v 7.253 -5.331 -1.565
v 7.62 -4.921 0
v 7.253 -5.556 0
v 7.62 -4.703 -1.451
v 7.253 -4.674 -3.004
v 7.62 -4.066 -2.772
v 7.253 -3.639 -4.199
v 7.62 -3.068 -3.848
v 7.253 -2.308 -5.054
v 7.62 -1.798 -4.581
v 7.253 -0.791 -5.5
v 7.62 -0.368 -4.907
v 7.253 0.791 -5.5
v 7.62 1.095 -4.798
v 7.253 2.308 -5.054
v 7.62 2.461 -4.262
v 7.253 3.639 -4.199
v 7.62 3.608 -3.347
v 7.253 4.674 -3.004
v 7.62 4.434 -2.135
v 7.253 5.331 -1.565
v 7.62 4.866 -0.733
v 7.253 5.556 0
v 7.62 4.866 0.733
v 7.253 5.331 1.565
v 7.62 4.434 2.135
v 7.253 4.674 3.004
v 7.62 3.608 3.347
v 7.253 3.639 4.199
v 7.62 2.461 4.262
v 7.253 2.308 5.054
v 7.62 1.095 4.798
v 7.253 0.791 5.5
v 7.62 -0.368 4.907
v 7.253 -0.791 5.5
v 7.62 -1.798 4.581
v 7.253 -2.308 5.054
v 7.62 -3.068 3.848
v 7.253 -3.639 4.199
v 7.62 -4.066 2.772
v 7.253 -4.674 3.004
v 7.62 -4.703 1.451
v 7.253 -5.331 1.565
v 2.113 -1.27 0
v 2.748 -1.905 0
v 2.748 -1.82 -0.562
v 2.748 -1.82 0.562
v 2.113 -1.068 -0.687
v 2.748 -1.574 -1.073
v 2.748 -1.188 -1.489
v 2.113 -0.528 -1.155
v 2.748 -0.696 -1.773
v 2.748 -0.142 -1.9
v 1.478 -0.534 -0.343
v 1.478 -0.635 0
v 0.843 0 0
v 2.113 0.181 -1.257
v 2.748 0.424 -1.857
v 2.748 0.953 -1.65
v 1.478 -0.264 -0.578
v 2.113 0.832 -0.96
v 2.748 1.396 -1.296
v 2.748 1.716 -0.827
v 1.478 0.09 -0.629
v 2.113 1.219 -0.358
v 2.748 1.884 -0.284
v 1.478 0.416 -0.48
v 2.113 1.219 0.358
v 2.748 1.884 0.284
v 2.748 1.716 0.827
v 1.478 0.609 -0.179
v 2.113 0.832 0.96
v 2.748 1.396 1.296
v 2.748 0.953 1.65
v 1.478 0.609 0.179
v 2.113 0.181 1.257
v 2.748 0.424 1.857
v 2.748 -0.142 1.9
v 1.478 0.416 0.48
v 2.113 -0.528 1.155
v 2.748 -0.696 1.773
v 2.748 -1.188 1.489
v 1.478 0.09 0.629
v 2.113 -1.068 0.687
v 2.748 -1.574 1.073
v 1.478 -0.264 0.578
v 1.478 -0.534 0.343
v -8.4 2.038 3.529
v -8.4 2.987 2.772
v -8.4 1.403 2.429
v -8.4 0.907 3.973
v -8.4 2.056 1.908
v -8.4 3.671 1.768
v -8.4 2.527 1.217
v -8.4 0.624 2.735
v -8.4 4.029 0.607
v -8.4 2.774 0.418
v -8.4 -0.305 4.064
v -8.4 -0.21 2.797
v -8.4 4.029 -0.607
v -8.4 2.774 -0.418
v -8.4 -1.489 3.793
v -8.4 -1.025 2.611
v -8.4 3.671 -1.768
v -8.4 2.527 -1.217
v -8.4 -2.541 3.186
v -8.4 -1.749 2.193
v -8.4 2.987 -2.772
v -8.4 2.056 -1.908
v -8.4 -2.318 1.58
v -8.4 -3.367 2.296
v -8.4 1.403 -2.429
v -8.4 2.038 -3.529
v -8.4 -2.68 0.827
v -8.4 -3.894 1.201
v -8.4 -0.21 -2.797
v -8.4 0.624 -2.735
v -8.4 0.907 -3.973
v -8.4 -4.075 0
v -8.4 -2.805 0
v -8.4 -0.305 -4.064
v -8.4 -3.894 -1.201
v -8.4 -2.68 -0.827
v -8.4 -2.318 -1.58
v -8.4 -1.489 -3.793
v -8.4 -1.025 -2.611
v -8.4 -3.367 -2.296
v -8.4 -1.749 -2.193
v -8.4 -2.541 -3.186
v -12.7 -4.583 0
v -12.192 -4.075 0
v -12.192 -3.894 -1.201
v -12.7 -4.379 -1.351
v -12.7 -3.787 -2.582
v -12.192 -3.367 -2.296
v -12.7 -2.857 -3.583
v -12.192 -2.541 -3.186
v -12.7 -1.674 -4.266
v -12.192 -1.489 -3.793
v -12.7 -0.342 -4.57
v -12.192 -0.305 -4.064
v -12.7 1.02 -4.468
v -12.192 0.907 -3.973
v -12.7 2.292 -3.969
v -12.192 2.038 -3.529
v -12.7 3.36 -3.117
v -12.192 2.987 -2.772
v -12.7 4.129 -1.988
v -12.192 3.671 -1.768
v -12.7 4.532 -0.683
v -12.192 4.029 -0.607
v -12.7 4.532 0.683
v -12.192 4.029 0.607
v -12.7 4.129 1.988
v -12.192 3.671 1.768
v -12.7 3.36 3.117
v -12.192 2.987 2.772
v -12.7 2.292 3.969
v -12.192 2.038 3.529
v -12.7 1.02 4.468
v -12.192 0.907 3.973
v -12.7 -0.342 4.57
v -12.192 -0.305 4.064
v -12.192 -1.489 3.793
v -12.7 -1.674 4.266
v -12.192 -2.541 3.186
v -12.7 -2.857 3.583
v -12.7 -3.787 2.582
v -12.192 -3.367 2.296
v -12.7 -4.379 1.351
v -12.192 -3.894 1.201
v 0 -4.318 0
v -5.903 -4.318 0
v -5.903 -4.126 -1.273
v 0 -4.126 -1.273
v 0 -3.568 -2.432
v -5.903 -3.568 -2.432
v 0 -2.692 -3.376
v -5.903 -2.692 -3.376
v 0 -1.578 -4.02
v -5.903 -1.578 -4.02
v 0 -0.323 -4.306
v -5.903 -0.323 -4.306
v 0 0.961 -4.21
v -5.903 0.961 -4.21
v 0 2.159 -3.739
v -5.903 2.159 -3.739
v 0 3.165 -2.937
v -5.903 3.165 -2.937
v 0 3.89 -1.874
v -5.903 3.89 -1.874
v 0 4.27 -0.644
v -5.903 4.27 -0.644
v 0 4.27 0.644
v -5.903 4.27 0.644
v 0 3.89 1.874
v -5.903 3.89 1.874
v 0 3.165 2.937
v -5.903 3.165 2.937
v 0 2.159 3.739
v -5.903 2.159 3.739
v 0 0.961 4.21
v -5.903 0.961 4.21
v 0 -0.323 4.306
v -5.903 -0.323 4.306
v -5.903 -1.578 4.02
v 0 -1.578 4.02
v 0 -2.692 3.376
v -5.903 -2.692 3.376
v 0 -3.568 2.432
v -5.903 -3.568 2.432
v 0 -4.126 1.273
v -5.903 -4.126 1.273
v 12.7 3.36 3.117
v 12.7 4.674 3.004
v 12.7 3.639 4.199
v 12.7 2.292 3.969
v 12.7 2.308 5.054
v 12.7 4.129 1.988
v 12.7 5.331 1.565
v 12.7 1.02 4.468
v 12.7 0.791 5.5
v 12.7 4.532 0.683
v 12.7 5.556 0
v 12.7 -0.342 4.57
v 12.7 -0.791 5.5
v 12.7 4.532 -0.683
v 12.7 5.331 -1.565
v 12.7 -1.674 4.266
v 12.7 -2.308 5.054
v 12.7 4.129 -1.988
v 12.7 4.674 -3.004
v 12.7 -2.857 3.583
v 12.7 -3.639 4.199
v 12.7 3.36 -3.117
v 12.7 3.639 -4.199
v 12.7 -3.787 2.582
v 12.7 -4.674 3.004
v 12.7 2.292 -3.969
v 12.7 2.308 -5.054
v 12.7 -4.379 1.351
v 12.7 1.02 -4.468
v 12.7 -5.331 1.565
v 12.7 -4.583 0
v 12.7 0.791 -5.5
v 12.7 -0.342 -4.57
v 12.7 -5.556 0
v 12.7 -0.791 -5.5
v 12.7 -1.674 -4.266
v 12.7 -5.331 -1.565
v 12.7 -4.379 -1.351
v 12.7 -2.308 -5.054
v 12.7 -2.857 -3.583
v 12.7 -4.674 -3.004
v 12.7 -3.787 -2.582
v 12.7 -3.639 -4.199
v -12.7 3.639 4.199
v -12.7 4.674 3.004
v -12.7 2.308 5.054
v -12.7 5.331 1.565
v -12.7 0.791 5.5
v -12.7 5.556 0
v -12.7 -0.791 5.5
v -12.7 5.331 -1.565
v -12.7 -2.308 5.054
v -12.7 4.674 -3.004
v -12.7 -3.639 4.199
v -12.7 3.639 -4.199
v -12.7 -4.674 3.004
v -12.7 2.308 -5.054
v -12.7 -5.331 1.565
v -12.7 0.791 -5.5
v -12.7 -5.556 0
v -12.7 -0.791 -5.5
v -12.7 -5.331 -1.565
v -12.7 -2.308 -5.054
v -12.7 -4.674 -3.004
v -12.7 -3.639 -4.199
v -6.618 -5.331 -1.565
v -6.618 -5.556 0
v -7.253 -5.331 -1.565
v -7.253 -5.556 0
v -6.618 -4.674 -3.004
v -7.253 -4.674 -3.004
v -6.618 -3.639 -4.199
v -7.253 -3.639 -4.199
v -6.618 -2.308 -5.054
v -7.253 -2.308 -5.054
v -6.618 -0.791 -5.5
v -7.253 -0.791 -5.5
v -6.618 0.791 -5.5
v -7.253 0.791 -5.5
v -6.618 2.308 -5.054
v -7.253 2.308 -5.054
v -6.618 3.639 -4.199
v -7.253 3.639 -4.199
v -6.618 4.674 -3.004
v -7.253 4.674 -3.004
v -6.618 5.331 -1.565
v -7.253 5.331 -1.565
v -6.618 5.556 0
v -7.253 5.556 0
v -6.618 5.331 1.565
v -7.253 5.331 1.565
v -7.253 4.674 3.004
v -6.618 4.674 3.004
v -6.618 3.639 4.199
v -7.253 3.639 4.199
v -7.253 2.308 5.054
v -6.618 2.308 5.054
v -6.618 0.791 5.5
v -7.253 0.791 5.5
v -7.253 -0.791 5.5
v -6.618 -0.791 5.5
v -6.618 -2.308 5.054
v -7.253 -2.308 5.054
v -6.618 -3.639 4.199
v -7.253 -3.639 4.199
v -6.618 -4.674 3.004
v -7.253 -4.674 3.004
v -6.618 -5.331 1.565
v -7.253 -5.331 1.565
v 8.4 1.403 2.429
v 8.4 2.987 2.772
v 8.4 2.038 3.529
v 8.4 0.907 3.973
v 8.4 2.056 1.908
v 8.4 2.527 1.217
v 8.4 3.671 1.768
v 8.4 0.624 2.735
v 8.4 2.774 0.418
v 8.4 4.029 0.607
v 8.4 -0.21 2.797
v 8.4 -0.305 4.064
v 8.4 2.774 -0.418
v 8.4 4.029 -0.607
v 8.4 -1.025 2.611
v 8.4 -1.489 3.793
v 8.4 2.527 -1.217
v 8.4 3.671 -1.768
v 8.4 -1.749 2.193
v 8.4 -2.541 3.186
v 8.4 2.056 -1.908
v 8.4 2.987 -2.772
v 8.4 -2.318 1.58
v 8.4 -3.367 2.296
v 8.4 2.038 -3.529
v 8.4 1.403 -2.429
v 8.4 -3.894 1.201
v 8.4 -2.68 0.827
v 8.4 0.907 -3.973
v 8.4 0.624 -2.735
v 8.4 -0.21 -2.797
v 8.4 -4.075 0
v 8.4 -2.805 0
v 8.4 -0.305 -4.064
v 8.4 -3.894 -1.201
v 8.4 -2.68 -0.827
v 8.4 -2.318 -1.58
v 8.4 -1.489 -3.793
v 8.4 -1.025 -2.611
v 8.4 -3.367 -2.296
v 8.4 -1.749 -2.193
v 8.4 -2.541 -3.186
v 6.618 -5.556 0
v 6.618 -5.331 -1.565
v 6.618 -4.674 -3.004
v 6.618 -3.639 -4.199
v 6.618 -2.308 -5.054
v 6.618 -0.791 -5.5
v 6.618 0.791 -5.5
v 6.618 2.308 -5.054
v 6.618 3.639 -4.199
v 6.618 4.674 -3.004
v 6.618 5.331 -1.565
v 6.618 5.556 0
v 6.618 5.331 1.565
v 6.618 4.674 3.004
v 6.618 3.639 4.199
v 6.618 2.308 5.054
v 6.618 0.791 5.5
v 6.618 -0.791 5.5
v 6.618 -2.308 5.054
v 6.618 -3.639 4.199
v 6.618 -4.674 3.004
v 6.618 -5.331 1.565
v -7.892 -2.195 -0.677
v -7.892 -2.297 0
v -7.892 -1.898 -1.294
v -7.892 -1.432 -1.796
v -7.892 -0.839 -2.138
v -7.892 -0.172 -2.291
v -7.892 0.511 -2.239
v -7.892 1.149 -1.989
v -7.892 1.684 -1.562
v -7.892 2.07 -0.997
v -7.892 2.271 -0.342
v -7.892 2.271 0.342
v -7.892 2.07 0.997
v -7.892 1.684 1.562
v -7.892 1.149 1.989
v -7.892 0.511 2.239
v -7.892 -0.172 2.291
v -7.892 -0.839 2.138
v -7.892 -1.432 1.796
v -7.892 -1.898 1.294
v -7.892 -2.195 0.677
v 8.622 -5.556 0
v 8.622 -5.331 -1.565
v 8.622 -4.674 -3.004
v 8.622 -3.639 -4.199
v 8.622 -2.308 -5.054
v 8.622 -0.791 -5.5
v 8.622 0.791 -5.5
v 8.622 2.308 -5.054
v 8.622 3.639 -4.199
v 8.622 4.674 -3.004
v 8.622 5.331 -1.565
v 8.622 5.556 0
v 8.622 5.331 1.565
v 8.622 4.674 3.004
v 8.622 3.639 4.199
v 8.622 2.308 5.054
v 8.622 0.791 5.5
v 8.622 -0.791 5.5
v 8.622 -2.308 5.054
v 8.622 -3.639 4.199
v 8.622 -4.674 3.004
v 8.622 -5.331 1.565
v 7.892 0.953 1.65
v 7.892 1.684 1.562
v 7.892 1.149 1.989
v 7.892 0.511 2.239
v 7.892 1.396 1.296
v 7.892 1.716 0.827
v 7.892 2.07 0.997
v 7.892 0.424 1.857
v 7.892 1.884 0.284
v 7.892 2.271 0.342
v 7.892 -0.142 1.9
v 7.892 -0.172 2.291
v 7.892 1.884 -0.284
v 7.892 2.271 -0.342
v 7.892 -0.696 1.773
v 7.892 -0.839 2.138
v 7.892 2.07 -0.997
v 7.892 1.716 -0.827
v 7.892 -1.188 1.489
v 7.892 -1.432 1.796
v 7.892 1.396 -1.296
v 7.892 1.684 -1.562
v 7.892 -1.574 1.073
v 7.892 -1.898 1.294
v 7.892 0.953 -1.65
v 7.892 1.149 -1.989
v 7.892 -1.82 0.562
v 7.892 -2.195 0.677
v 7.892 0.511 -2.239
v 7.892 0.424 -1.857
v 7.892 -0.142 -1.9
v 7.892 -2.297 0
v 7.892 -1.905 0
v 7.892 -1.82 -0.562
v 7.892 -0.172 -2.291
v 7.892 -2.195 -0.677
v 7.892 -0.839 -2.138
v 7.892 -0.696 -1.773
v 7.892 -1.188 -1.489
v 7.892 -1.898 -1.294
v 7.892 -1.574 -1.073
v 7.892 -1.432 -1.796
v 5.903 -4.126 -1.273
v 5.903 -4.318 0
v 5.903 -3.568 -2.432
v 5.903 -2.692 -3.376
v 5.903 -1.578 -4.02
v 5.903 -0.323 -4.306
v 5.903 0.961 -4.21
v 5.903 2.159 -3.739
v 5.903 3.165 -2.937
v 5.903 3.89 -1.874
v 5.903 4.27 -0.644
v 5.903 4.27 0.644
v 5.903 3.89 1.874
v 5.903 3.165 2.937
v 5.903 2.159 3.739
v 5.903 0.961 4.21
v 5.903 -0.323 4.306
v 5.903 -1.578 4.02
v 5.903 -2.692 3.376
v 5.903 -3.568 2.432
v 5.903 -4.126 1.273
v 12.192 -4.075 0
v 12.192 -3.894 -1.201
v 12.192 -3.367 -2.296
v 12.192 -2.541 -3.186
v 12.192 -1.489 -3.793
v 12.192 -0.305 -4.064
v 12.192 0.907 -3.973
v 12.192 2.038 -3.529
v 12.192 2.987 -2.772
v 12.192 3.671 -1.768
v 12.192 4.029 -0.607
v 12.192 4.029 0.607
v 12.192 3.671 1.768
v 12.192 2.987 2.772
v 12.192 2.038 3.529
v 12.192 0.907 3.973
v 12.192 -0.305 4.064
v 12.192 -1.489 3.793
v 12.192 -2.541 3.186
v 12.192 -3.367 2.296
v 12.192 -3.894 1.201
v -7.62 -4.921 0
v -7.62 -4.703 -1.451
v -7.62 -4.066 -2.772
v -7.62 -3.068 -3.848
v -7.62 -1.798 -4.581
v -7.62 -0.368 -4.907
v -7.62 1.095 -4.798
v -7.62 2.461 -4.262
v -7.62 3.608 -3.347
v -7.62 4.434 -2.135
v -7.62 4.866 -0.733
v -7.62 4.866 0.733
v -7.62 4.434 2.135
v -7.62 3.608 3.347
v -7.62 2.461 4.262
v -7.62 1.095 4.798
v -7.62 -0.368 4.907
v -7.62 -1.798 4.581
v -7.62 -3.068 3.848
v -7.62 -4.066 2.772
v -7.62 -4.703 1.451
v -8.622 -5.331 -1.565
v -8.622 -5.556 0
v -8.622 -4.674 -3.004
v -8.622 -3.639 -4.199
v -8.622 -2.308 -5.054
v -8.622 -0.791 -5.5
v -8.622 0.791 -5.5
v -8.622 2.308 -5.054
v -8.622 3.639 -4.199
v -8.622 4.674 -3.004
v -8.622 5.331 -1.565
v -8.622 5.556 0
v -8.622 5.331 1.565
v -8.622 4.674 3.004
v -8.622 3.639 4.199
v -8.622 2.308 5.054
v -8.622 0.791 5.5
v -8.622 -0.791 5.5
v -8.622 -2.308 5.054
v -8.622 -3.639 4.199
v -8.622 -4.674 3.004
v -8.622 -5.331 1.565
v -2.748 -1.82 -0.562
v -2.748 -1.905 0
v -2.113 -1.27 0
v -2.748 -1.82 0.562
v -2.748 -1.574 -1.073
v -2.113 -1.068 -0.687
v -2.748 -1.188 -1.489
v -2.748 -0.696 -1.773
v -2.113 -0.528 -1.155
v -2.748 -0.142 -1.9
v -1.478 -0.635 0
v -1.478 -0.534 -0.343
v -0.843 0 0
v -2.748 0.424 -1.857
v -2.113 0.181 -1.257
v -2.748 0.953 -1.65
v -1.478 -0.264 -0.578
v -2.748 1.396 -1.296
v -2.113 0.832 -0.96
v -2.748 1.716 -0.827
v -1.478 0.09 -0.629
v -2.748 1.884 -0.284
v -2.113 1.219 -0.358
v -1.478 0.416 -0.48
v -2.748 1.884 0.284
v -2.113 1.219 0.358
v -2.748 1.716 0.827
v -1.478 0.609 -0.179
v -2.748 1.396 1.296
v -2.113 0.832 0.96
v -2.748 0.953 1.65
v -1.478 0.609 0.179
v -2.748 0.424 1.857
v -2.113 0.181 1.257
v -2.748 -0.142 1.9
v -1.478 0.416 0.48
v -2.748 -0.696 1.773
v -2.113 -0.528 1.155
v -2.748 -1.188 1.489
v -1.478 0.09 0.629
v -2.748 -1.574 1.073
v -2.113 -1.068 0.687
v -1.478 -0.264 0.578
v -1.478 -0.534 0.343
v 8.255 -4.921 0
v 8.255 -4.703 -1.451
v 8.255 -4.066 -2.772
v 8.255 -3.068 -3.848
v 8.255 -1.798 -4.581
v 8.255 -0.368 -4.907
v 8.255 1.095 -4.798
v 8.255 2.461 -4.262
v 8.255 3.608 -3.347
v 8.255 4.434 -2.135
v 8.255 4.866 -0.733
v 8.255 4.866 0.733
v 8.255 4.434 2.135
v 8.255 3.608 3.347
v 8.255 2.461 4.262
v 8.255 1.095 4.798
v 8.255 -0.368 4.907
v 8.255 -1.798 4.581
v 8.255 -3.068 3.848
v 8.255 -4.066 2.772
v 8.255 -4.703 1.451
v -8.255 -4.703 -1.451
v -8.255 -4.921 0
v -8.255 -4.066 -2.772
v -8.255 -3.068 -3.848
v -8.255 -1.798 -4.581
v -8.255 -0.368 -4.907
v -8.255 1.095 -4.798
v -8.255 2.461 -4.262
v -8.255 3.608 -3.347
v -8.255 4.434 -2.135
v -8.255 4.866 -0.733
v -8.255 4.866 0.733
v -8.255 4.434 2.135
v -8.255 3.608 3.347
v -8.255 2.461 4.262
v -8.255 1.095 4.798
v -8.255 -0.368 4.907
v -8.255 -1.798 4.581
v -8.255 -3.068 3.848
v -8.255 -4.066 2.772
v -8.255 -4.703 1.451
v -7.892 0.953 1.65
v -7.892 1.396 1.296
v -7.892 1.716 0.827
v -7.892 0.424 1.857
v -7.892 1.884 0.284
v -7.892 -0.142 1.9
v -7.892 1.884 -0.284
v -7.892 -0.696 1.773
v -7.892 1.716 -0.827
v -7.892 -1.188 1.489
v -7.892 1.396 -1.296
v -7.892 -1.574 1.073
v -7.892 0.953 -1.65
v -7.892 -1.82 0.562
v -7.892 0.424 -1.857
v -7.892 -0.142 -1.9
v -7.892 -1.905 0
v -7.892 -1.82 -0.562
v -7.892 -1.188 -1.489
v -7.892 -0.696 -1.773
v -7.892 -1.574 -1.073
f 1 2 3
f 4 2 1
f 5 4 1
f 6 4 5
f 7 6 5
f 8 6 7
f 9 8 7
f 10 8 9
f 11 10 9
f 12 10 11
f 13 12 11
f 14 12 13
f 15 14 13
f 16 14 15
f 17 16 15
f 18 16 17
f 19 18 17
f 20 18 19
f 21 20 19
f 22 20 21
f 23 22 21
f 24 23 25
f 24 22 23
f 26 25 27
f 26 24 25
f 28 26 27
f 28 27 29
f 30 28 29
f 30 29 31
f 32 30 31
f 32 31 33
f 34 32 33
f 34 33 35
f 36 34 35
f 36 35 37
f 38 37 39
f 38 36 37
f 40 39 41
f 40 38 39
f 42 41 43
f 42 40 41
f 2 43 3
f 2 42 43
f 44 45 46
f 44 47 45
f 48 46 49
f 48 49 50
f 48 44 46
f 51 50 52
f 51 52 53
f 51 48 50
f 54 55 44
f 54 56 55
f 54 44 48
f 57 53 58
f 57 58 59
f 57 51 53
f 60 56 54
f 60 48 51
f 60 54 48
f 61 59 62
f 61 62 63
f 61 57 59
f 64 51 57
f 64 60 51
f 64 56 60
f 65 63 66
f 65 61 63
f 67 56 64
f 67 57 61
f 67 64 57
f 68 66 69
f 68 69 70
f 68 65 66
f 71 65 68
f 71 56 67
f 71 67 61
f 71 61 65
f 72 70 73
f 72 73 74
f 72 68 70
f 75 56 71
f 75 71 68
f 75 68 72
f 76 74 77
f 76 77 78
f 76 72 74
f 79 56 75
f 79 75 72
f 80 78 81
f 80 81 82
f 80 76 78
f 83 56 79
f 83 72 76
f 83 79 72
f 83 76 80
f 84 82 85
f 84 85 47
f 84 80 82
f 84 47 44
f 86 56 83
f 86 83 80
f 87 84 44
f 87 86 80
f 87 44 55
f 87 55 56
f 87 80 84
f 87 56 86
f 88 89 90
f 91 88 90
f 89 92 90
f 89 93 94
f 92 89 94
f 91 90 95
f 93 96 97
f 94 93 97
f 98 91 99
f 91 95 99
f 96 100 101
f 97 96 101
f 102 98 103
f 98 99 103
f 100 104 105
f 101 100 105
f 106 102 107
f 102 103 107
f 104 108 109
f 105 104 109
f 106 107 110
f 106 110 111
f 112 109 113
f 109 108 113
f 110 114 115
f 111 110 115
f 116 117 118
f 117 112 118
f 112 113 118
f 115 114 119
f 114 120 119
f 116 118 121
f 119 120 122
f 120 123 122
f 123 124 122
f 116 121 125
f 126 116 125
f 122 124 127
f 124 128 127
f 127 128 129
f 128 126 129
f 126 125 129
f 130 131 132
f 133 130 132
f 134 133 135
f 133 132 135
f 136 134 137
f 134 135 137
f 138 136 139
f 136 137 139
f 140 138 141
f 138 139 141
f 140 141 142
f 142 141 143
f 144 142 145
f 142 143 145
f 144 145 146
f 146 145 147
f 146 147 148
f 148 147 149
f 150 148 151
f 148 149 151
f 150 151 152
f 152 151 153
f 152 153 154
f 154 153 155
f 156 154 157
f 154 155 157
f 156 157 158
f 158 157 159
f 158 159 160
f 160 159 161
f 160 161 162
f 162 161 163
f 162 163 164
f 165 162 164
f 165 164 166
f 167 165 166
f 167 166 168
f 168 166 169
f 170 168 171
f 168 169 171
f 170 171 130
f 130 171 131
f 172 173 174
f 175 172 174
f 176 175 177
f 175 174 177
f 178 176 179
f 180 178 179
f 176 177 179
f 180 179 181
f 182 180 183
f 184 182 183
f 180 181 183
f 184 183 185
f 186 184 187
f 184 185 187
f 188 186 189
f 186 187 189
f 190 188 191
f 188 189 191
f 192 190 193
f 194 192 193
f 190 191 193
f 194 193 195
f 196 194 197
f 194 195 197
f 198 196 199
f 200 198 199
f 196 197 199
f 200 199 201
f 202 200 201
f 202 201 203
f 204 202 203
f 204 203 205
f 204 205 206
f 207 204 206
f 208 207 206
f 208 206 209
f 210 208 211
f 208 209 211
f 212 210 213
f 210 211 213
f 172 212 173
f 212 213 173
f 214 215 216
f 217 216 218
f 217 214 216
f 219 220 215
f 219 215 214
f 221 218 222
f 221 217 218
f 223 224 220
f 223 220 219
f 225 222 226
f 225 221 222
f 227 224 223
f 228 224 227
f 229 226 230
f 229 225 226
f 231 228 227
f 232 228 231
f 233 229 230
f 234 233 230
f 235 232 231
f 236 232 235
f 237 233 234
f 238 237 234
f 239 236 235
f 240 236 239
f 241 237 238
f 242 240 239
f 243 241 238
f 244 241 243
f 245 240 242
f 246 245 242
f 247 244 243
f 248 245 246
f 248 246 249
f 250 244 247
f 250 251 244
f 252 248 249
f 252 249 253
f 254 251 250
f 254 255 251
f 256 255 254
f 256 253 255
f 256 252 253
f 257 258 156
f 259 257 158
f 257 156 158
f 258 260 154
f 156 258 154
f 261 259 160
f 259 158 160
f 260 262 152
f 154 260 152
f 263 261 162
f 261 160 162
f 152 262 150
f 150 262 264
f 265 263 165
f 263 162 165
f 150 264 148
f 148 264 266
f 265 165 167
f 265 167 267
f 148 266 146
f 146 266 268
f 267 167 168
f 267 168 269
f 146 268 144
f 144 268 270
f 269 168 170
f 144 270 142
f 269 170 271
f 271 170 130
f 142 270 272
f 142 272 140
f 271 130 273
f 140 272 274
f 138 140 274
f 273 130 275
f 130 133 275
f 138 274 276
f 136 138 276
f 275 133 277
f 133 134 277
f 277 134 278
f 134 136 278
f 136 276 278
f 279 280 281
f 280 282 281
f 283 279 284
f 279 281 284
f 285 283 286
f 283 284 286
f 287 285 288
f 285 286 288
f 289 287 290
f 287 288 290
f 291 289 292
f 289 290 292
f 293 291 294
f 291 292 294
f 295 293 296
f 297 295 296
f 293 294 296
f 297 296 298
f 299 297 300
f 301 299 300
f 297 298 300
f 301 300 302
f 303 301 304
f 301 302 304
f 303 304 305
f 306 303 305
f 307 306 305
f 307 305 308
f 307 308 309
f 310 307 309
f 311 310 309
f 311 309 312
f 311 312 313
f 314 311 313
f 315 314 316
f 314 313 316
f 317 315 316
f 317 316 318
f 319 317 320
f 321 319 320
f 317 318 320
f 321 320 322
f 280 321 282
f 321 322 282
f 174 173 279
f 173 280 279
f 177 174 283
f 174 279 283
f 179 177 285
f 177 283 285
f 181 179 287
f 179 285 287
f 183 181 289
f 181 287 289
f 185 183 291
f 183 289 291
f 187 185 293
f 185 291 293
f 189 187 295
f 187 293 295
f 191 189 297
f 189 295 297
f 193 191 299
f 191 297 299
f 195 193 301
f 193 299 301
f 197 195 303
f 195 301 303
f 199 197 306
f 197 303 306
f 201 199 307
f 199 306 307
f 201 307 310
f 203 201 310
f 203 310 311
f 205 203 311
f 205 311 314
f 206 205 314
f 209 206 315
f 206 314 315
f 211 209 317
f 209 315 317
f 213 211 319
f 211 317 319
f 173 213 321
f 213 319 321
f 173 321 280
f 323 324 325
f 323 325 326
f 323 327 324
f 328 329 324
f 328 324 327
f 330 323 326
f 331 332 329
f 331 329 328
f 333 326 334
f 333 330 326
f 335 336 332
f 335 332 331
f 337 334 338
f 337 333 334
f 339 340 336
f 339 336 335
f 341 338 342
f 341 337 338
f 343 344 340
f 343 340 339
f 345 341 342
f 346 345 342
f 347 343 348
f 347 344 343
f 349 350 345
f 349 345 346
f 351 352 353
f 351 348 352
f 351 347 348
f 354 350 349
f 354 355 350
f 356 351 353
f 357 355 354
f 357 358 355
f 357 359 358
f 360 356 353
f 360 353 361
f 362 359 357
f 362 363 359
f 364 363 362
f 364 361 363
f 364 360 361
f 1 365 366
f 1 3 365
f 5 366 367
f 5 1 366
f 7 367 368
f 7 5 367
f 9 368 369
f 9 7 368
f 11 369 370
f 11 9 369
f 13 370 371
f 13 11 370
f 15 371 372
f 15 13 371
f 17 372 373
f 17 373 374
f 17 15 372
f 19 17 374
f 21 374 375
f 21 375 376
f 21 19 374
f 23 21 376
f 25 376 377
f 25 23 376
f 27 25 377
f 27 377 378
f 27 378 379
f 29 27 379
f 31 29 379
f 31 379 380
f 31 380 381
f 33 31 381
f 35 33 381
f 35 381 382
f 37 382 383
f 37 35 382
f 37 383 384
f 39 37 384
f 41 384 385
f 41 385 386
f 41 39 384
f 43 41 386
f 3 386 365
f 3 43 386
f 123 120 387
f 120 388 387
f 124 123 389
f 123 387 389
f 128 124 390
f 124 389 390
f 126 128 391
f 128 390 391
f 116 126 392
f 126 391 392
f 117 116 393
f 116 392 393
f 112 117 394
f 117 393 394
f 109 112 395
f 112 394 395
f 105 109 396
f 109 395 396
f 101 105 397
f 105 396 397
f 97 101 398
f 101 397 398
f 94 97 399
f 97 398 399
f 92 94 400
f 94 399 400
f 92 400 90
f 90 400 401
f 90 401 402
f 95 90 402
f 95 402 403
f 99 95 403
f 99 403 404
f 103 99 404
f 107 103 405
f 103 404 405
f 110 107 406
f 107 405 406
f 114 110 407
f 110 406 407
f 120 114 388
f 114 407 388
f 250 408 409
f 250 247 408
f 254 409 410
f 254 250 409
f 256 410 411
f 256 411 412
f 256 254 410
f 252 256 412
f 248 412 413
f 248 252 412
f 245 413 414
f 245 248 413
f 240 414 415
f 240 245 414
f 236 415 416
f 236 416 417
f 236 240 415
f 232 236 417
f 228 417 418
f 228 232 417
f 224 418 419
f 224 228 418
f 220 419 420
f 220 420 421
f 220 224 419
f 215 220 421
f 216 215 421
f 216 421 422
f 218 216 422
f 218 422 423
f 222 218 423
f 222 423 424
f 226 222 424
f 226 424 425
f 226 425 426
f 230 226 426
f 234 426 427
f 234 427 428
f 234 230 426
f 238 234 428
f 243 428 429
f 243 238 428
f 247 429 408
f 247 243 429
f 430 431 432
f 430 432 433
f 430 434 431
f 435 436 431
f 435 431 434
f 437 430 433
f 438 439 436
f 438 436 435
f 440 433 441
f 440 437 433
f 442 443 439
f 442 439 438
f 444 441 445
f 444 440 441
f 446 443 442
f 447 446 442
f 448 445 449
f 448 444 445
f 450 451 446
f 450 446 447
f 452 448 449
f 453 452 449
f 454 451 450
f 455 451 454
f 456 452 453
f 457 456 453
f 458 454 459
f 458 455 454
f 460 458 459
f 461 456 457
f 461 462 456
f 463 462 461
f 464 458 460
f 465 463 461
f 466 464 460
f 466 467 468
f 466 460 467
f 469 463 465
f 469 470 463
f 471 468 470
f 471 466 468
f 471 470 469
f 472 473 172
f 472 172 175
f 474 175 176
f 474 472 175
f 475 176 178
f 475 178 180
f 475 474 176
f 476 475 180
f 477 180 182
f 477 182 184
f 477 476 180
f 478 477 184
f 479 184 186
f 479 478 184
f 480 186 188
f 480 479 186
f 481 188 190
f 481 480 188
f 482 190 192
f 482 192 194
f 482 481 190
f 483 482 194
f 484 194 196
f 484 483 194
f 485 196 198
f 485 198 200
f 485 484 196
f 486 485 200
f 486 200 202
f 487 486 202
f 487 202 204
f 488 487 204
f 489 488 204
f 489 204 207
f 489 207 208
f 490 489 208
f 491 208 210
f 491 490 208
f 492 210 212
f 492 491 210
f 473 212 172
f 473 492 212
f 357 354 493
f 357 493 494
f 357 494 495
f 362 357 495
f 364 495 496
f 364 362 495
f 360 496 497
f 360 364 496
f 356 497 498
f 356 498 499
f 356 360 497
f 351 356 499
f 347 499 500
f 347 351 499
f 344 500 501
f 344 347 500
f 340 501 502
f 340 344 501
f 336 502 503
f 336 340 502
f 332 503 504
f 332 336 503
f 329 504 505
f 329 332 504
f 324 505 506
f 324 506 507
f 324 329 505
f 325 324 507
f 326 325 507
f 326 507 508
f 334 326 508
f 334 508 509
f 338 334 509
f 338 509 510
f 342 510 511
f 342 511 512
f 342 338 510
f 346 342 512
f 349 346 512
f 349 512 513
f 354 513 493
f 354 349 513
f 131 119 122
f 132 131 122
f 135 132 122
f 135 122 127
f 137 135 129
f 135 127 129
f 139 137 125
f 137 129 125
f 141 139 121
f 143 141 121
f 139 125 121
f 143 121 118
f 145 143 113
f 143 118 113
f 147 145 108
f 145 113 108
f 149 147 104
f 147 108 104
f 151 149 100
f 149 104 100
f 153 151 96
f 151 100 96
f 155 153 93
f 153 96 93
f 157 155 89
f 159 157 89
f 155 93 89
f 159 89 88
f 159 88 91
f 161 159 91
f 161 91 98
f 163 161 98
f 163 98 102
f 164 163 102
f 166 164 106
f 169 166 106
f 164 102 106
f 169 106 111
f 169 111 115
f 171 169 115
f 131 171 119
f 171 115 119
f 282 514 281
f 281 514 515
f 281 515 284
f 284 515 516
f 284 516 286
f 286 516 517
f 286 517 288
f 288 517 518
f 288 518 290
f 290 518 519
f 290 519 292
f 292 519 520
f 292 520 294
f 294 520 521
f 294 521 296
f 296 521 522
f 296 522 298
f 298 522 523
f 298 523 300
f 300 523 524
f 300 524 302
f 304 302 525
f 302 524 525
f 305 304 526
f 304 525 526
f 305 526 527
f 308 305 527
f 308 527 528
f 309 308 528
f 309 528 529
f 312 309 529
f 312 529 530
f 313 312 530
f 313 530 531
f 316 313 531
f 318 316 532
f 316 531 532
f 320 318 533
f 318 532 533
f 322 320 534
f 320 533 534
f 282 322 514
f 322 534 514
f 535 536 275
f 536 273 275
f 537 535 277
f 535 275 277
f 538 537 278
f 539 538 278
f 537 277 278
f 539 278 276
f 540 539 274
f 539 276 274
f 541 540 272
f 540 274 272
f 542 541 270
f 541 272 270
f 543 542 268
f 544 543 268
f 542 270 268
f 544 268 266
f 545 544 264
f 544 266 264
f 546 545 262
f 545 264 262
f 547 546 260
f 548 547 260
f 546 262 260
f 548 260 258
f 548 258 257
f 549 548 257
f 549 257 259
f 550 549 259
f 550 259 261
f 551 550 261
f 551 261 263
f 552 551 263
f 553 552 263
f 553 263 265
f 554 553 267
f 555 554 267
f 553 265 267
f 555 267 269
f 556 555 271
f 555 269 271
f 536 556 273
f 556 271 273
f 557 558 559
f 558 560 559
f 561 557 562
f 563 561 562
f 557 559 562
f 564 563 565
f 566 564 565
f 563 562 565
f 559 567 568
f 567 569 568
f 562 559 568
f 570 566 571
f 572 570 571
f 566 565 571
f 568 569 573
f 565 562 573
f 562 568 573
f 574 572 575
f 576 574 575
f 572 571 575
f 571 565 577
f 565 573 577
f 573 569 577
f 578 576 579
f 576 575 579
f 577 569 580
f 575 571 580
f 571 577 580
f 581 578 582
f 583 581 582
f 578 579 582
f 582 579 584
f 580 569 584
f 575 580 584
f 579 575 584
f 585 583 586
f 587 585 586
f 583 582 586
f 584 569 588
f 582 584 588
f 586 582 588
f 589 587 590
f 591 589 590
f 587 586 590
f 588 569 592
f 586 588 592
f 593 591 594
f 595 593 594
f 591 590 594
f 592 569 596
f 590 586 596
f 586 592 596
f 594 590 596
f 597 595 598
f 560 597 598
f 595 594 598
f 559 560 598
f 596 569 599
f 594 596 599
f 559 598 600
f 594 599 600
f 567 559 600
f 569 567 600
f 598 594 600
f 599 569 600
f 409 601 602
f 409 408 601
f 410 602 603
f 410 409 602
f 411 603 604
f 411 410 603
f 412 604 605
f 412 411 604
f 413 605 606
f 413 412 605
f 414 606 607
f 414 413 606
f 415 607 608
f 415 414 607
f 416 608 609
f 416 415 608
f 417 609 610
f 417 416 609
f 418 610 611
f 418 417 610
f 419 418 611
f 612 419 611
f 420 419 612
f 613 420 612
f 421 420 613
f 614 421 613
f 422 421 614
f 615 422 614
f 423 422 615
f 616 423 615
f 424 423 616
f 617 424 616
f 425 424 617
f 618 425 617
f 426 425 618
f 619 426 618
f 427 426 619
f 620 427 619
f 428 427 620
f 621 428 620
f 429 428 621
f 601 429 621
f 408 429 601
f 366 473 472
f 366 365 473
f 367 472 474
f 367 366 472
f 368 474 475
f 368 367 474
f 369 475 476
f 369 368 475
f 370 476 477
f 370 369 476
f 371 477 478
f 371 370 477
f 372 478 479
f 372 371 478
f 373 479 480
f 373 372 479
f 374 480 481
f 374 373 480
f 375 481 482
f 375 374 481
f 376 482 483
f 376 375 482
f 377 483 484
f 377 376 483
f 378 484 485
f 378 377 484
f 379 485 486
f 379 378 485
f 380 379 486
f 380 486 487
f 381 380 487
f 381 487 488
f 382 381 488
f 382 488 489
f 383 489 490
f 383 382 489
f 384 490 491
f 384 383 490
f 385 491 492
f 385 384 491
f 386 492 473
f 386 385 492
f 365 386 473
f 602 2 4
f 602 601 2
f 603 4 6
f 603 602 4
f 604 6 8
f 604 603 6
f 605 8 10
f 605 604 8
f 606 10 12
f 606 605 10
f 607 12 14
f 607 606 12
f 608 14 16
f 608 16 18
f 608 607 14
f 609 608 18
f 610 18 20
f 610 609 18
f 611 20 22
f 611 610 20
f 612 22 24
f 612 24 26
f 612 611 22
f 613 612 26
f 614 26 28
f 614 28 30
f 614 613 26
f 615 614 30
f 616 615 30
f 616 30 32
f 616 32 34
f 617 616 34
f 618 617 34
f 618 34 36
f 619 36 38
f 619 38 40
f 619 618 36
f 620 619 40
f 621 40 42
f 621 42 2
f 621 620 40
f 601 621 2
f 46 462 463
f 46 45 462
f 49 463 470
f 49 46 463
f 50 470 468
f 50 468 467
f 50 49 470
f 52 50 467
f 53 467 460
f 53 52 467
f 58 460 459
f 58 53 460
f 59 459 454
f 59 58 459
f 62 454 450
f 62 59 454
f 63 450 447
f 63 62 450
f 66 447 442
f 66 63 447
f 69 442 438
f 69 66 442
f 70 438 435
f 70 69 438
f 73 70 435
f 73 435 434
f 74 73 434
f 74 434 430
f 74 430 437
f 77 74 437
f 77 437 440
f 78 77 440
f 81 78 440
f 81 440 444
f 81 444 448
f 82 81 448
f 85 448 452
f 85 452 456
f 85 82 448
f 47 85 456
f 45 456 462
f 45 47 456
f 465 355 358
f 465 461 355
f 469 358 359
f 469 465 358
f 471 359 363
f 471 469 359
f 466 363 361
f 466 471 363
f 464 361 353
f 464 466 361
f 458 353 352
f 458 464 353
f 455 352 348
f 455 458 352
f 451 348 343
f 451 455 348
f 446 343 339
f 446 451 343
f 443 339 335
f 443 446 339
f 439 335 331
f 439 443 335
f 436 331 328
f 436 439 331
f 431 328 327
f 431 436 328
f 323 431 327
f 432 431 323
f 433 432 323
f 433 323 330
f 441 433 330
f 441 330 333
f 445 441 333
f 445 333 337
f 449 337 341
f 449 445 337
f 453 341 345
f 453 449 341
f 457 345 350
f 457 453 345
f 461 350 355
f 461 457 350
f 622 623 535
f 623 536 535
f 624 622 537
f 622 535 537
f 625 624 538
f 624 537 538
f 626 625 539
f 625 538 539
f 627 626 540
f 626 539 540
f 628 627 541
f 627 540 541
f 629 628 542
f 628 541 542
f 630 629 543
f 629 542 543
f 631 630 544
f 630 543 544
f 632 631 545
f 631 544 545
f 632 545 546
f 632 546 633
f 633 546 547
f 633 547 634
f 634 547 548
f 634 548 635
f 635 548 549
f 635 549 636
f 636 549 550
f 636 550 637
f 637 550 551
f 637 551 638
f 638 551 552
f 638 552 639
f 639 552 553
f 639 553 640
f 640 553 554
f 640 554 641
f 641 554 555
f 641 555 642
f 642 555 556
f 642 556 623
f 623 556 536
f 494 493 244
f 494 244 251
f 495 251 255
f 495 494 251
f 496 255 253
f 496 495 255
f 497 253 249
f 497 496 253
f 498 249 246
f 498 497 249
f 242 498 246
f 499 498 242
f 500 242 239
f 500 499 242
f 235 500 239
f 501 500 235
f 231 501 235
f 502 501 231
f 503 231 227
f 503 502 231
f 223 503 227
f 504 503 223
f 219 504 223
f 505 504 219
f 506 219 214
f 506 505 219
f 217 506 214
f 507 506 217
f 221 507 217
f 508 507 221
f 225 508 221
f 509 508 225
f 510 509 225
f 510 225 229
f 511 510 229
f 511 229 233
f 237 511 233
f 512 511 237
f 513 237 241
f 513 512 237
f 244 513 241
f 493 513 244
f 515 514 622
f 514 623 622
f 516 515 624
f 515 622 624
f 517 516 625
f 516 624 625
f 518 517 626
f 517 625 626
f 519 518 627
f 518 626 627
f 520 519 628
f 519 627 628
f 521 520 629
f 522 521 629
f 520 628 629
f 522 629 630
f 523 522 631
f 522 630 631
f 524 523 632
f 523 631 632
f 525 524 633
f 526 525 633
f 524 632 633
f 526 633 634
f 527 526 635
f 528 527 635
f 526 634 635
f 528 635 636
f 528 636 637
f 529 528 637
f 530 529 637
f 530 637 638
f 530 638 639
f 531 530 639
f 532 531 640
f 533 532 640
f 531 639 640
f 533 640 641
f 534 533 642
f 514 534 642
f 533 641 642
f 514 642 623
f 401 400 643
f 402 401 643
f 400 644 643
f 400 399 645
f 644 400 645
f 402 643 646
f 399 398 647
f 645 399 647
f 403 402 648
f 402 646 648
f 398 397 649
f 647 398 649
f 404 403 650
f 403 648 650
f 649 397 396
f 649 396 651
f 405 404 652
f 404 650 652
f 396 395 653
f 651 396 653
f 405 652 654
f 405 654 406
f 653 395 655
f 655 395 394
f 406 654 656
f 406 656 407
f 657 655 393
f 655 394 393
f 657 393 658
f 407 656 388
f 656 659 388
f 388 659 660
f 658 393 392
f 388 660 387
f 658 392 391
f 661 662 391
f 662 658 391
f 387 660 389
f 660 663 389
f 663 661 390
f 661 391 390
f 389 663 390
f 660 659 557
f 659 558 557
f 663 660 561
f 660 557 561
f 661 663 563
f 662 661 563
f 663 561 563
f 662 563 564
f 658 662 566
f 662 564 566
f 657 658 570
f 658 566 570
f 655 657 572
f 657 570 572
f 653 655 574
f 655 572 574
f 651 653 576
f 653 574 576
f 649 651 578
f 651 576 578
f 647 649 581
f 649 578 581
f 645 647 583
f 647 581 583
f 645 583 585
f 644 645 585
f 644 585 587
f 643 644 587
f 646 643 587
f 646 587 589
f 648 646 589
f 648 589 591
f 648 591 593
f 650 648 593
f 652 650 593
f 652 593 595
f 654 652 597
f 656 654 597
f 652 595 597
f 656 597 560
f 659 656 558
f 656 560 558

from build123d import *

# Parameters (mm, degrees)
CHAMFER1_SIZE = 0.508


with BuildPart() as part:
    # Sketch2 → Revolve1 (revolve)
    with BuildSketch(Plane.XY, mode=Mode.PRIVATE) as revolve1_sk:
        Polygon((-8.621617421, 5.55625), (-12.7, 5.55625), (-12.7, 4.075), (-8.399999964, 4.075), (-8.399999964, 2.805), (-7.891999964, 2.297), (-7.891999964, 1.905), (-2.748, 1.905), (-0.843, 0), (0, 0), (0, 4.318), (-5.903478608, 4.318), (-6.618382579, 5.55625), (-7.253382579, 5.55625), (-7.62, 4.92125), (-8.255, 4.92125), align=None)
    revolve(revolve1_sk.sketch.rotate(Axis((-12.7, 0, 0), (1, 0, 0)), 180), axis=Axis((-12.7, 0, 0), (1, 0, 0)))

    # Chamfer1
    chamfer1_edges = [part.edges().sort_by_distance(p)[0] for p in [
        (-12.7, 4.075, 0),
    ]]
    chamfer(chamfer1_edges, length=CHAMFER1_SIZE)

    # Mirror1: part across plane


with BuildPart() as part_1:
    add(part.part)
    add(part.part.mirror(Plane(origin=(0, 0, 0), x_dir=(0, 0, 1), z_dir=(1, 0, 0))))


solid = part_1.part
